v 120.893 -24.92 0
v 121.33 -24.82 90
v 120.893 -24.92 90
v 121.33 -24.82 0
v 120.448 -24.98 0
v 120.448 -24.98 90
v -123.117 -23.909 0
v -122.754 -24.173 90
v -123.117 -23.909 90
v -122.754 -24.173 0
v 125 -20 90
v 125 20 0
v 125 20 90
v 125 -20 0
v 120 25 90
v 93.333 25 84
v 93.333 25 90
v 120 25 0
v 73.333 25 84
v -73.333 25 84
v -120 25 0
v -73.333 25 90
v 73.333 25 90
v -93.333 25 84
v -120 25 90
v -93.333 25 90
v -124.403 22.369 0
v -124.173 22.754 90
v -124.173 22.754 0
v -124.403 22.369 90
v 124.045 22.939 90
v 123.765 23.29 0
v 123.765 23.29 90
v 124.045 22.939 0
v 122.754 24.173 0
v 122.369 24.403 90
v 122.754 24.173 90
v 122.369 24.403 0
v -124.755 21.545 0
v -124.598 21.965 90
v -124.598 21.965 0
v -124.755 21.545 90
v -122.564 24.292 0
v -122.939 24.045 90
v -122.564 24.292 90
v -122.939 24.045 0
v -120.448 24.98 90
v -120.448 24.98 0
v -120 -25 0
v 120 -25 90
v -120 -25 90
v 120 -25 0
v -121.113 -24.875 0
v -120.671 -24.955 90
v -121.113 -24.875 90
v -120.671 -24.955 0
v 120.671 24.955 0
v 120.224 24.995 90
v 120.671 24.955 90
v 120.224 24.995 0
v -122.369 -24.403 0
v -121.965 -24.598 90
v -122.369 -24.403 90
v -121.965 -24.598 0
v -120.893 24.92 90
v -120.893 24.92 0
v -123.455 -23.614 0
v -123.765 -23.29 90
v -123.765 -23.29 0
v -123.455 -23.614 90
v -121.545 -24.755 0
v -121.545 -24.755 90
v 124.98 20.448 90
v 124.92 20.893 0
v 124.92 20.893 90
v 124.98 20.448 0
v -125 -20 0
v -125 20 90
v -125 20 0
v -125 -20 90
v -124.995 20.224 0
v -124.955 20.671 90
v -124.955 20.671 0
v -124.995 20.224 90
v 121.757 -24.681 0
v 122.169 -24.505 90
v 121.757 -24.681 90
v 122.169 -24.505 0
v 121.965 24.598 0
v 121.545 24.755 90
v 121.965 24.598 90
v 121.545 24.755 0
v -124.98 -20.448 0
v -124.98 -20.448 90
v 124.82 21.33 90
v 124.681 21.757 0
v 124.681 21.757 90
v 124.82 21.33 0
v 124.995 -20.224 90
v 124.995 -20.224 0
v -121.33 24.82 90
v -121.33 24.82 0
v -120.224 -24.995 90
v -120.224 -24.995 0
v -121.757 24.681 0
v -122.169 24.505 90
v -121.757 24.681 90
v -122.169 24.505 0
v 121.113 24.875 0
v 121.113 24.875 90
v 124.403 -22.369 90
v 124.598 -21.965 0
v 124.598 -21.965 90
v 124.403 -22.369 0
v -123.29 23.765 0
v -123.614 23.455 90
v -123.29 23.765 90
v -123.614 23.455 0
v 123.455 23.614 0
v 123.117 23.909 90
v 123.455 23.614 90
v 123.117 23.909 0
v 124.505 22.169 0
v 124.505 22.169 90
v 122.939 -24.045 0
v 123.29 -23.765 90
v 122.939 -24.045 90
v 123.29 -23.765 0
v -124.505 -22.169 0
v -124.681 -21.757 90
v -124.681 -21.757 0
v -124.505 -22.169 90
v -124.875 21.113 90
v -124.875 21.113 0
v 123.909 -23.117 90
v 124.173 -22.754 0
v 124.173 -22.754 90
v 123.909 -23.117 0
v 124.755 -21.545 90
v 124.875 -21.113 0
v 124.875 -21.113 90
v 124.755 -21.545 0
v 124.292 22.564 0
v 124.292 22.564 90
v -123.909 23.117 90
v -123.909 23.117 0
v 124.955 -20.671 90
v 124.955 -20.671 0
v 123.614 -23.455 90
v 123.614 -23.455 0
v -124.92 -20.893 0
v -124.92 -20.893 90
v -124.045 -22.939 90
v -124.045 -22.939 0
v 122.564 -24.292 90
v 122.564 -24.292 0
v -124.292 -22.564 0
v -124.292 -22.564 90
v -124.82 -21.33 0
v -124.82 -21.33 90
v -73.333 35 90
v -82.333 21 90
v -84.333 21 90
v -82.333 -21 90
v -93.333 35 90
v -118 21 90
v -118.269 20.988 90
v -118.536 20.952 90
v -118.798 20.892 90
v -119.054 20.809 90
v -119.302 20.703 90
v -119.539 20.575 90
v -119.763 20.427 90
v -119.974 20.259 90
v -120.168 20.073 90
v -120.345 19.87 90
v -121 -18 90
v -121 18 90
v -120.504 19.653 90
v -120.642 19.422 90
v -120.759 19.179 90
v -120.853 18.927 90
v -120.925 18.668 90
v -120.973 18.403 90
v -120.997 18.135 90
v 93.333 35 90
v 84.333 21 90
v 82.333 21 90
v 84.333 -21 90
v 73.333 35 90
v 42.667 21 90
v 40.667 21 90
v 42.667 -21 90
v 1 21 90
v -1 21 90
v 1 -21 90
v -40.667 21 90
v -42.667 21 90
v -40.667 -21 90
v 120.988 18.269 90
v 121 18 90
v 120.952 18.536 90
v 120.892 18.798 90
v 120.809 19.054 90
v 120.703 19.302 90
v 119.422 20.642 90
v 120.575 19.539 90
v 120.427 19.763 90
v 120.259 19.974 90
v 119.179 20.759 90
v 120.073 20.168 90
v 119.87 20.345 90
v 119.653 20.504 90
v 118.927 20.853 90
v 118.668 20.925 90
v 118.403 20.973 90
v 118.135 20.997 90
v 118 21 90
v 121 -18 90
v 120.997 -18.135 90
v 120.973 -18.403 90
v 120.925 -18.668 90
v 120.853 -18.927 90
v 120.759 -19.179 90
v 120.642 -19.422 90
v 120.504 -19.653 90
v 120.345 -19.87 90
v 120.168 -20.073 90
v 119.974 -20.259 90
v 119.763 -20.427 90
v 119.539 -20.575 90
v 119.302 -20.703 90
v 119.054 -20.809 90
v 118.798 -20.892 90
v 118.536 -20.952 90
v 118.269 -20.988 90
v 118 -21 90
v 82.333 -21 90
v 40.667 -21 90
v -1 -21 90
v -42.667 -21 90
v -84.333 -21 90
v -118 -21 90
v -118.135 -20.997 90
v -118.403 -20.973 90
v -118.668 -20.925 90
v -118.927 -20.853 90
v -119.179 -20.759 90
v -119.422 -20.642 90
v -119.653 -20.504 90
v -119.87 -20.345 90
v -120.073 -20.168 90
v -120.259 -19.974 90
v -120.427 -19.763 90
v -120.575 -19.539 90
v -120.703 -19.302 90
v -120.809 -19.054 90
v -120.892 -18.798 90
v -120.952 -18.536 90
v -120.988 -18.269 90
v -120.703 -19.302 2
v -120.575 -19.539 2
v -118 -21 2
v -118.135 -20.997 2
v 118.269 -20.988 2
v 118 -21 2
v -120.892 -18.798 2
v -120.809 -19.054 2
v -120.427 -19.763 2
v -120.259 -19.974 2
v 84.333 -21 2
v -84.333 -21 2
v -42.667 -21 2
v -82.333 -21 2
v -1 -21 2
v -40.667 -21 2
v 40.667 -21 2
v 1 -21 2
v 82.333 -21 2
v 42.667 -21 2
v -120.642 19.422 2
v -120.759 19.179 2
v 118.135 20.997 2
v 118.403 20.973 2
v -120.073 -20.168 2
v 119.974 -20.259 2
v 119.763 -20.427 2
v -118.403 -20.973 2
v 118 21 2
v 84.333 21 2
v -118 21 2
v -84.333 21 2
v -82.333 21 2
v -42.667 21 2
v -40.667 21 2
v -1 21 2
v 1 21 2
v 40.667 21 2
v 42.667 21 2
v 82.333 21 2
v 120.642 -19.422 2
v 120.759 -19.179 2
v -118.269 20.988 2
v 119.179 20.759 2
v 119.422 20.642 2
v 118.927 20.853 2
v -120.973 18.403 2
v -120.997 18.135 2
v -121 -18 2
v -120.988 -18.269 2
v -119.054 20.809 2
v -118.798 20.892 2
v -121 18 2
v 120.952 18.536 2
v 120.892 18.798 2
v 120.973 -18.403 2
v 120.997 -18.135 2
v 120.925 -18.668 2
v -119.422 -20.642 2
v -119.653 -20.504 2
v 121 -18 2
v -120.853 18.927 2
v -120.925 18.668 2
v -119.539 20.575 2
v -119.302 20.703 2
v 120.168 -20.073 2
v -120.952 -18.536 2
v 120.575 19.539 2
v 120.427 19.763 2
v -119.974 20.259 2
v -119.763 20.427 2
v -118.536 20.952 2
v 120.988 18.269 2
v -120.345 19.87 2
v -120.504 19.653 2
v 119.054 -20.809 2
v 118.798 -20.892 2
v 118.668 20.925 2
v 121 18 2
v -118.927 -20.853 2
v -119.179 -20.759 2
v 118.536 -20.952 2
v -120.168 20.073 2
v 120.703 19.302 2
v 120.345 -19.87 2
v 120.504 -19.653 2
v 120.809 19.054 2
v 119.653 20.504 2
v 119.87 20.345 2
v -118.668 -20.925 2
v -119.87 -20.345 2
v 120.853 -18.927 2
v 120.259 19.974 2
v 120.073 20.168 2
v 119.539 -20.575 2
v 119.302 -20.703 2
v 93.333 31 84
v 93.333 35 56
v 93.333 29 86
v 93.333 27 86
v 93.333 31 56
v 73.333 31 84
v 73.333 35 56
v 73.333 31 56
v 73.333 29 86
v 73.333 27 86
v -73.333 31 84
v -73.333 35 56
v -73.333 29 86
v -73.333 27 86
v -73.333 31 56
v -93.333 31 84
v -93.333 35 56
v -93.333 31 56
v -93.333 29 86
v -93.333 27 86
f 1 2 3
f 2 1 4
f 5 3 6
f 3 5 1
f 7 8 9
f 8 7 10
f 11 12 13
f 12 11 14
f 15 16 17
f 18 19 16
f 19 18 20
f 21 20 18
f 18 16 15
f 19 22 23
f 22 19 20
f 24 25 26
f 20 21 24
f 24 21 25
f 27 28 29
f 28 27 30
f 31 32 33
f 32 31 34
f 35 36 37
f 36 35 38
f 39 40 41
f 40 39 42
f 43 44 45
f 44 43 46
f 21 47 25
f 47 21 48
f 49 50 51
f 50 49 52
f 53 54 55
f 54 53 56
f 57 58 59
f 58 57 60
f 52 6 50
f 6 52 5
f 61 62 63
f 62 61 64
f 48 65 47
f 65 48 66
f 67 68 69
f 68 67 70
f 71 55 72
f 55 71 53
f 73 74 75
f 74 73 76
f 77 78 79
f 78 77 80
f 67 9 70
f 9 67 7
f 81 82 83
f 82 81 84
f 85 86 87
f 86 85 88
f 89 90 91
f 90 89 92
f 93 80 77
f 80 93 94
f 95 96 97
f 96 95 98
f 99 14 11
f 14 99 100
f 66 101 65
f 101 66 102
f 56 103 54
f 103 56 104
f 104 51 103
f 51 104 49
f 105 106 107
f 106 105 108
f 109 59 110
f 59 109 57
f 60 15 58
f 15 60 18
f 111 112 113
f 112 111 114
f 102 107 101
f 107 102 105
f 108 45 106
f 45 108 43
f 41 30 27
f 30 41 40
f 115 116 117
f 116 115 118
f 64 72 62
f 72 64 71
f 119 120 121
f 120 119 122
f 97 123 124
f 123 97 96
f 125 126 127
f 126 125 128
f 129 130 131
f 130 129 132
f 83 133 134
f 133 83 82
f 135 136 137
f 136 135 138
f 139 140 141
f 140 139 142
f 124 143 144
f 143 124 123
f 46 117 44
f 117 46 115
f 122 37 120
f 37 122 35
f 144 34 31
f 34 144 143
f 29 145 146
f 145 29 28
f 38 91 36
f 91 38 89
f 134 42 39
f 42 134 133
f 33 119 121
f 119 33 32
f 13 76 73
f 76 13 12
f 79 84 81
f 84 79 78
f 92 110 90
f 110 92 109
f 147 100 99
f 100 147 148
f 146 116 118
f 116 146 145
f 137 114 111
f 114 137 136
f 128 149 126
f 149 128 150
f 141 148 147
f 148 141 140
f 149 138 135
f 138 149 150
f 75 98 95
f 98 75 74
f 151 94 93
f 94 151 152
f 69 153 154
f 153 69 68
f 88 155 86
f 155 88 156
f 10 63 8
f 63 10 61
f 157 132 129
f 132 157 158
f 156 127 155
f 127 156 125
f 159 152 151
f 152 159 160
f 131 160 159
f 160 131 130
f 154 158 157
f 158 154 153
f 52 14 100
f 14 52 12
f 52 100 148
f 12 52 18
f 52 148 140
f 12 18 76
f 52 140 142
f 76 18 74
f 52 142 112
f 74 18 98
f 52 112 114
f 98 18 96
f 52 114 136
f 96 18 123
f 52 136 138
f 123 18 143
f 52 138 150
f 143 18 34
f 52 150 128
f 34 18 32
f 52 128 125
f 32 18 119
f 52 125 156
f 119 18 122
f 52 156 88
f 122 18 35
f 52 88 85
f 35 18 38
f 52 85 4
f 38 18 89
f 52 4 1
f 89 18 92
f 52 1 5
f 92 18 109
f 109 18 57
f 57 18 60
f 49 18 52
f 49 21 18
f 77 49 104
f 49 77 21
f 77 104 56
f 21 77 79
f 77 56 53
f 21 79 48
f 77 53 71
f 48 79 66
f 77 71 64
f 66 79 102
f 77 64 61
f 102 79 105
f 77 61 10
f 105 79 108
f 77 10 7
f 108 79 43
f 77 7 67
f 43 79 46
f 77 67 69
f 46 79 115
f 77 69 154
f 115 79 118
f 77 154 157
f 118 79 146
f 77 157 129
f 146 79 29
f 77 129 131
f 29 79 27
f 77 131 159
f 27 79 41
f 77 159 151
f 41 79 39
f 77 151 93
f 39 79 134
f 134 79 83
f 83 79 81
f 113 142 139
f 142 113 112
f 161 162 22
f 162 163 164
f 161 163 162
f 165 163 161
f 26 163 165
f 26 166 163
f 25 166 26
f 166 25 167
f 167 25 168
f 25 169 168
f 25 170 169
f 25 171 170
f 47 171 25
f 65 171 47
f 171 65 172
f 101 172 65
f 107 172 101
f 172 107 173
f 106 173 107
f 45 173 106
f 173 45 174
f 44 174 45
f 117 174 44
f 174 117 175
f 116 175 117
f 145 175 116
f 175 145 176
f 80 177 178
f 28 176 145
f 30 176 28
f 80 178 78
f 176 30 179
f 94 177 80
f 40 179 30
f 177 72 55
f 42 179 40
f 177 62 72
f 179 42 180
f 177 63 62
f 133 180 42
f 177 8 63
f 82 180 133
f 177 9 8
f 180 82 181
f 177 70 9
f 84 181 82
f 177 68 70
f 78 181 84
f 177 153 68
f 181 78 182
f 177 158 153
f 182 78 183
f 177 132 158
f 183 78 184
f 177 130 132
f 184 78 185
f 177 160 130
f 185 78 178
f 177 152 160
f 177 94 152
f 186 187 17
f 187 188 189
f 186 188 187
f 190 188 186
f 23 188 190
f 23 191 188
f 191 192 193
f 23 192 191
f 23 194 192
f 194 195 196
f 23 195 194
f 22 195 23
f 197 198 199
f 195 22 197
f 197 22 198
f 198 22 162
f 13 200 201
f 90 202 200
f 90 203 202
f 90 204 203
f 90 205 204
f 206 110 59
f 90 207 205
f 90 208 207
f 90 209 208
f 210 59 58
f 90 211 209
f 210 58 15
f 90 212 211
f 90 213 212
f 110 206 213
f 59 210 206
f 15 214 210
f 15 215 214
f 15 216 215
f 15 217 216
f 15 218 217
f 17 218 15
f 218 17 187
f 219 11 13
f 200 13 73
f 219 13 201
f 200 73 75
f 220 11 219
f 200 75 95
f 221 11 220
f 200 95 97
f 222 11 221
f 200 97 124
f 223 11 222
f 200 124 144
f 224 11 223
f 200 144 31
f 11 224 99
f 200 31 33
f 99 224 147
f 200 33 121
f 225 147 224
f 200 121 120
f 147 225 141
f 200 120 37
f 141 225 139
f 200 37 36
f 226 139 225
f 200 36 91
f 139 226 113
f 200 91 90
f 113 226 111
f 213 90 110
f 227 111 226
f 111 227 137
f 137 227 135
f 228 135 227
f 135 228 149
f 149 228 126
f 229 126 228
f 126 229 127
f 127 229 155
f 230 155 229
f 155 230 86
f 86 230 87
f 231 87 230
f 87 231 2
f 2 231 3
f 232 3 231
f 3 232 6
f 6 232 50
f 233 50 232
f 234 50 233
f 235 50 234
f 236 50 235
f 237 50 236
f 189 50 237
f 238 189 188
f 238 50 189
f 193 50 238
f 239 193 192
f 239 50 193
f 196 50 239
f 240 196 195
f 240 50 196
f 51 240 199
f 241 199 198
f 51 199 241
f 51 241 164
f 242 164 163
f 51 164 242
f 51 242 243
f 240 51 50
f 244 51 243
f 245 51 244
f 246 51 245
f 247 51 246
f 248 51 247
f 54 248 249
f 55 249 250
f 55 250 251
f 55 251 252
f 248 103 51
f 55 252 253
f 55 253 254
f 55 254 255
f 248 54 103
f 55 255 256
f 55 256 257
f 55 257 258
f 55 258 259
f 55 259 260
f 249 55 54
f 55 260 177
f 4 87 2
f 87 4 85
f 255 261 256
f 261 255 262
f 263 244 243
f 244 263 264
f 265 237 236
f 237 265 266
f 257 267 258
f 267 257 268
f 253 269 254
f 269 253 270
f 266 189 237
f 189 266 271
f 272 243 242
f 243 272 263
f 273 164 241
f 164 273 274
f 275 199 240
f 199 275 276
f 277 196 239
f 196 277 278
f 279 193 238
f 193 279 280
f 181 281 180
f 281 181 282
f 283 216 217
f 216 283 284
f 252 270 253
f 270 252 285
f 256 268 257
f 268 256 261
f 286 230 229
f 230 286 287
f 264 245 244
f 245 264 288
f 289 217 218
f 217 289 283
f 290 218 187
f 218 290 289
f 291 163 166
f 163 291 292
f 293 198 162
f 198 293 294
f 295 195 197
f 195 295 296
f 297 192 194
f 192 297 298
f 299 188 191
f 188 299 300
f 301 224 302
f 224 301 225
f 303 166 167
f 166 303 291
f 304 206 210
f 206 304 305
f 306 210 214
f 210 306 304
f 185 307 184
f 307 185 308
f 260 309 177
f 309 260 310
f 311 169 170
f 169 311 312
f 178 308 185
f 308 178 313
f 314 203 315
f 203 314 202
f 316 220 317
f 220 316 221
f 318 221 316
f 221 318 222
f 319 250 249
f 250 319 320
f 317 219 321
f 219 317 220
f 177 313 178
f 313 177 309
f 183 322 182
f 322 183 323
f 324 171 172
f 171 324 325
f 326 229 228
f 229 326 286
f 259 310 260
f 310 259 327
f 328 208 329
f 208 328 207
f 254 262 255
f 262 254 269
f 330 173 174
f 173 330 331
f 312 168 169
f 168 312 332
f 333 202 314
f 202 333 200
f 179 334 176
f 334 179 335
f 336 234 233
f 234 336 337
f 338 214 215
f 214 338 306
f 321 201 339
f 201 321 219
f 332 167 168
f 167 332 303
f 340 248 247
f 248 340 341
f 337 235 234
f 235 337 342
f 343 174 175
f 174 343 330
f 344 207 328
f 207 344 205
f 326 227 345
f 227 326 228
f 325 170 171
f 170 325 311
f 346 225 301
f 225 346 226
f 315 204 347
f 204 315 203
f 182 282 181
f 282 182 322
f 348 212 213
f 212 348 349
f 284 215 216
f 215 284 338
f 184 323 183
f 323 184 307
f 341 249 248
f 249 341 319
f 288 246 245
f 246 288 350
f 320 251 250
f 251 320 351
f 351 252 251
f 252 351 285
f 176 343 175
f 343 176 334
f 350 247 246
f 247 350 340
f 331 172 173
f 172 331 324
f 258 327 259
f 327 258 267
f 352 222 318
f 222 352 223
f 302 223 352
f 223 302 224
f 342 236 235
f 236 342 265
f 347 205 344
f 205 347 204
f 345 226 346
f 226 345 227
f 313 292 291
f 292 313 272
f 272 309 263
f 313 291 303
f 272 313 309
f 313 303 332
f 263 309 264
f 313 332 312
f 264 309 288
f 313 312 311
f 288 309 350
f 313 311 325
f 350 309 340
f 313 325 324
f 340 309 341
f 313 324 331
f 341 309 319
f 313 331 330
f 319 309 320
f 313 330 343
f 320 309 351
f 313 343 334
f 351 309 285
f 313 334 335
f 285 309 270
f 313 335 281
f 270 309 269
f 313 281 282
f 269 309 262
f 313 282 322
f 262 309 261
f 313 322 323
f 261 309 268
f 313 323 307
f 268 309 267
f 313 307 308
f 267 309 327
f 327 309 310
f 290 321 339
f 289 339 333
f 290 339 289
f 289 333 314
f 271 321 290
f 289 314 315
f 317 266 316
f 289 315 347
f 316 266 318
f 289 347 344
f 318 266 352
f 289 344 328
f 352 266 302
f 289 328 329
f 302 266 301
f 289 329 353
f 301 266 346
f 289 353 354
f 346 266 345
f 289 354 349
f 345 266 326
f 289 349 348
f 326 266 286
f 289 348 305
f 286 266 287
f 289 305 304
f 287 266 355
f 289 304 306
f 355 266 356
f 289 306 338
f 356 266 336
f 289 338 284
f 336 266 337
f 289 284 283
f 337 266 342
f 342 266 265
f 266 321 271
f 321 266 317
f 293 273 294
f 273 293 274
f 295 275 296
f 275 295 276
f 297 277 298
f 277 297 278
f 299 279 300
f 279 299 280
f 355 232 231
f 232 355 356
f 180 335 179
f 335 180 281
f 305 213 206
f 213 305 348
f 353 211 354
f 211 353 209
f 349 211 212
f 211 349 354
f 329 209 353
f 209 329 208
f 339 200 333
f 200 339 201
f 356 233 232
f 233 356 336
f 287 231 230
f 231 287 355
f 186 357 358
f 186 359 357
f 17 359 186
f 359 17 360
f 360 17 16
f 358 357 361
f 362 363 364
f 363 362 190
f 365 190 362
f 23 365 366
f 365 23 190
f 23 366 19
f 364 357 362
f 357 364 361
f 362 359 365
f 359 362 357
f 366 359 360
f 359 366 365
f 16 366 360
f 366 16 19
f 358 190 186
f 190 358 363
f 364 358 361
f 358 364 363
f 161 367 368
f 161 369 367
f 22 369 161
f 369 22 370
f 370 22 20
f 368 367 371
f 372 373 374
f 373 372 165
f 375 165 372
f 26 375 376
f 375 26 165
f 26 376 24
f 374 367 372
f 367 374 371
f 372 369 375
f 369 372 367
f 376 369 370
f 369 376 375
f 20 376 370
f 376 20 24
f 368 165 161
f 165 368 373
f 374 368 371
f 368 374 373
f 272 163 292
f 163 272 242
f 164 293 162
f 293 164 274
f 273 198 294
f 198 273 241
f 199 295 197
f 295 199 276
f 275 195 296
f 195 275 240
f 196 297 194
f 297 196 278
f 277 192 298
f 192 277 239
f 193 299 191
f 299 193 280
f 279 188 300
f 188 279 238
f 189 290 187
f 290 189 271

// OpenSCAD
$fn = 70;

// Variables {{{

width = 250;
height = 50;
depth = 90;
r = 5;

thickness = 2;

hook_inner_size = 6;
hook_thickness = 4;
hook_nail_length = 30;
hook_width = 20;
hook_inner_r = 2;

cells = 6;

// }}}

// Utils {{{

module fillet2d(r, d = 0)
{
    offset(r = r - d) offset(delta = -r) children(0);
}

// }}}

// Core {{{

module box()
{
    difference()
    {

        linear_extrude(height = depth)
        {
            fillet2d(r = 5, d = 0)
            {
                square([ width, height ], center = true);
            }
        }

        translate([ 0, 0, thickness ])
        {
            linear_extrude(height = depth)
            {
                fillet2d(r = 5, d = thickness)
                {
                    square([ width - thickness * 2, height - thickness * 2 ], center = true);
                }
            }
        }
    }
}

module hook()
{
    r = hook_inner_r;

    translate([ 0, height / 2, depth - hook_nail_length - hook_thickness ])
    {
        rotate([ 0, -90, 0 ])
        {
            linear_extrude(height = hook_width, center = true)
            {
                translate([ hook_nail_length - r, hook_inner_size - r ])
                {
                    polygon([
                        [ r, r ],
                        [ r, 0 ],
                        [ 0, r ],
                    ]);
                }

                translate([ hook_nail_length - r, 0 ])
                {
                    polygon([
                        [ r, r ],
                        [ r, 0 ],
                        [ 0, 0 ],
                    ]);
                }

                translate([ hook_nail_length, 0 ])
                {
                    square([ hook_thickness, hook_inner_size + hook_thickness ]);
                }

                translate([ 0, hook_inner_size ])
                {
                    square([ hook_nail_length, hook_thickness ]);
                }
            }
        }
    }
}

module hooks()
{
    translate([ width / 3, 0, 0 ])
    {
        hook();
    }

    translate([ -width / 3, 0, 0 ])
    {
        hook();
    }
}

module separator()
{
    linear_extrude(height = depth)
    {
        square([ thickness, height ], center = true);
    }
}

module separators()
{
    translate([ -width / 2, 0, 0 ])
    {
        for (i = [1:cells - 1])
        {
            translate([ i * width / cells, 0, 0 ])
            {
                separator();
            }
        }
    }
}

// }}}

box();
hooks();
separators();
